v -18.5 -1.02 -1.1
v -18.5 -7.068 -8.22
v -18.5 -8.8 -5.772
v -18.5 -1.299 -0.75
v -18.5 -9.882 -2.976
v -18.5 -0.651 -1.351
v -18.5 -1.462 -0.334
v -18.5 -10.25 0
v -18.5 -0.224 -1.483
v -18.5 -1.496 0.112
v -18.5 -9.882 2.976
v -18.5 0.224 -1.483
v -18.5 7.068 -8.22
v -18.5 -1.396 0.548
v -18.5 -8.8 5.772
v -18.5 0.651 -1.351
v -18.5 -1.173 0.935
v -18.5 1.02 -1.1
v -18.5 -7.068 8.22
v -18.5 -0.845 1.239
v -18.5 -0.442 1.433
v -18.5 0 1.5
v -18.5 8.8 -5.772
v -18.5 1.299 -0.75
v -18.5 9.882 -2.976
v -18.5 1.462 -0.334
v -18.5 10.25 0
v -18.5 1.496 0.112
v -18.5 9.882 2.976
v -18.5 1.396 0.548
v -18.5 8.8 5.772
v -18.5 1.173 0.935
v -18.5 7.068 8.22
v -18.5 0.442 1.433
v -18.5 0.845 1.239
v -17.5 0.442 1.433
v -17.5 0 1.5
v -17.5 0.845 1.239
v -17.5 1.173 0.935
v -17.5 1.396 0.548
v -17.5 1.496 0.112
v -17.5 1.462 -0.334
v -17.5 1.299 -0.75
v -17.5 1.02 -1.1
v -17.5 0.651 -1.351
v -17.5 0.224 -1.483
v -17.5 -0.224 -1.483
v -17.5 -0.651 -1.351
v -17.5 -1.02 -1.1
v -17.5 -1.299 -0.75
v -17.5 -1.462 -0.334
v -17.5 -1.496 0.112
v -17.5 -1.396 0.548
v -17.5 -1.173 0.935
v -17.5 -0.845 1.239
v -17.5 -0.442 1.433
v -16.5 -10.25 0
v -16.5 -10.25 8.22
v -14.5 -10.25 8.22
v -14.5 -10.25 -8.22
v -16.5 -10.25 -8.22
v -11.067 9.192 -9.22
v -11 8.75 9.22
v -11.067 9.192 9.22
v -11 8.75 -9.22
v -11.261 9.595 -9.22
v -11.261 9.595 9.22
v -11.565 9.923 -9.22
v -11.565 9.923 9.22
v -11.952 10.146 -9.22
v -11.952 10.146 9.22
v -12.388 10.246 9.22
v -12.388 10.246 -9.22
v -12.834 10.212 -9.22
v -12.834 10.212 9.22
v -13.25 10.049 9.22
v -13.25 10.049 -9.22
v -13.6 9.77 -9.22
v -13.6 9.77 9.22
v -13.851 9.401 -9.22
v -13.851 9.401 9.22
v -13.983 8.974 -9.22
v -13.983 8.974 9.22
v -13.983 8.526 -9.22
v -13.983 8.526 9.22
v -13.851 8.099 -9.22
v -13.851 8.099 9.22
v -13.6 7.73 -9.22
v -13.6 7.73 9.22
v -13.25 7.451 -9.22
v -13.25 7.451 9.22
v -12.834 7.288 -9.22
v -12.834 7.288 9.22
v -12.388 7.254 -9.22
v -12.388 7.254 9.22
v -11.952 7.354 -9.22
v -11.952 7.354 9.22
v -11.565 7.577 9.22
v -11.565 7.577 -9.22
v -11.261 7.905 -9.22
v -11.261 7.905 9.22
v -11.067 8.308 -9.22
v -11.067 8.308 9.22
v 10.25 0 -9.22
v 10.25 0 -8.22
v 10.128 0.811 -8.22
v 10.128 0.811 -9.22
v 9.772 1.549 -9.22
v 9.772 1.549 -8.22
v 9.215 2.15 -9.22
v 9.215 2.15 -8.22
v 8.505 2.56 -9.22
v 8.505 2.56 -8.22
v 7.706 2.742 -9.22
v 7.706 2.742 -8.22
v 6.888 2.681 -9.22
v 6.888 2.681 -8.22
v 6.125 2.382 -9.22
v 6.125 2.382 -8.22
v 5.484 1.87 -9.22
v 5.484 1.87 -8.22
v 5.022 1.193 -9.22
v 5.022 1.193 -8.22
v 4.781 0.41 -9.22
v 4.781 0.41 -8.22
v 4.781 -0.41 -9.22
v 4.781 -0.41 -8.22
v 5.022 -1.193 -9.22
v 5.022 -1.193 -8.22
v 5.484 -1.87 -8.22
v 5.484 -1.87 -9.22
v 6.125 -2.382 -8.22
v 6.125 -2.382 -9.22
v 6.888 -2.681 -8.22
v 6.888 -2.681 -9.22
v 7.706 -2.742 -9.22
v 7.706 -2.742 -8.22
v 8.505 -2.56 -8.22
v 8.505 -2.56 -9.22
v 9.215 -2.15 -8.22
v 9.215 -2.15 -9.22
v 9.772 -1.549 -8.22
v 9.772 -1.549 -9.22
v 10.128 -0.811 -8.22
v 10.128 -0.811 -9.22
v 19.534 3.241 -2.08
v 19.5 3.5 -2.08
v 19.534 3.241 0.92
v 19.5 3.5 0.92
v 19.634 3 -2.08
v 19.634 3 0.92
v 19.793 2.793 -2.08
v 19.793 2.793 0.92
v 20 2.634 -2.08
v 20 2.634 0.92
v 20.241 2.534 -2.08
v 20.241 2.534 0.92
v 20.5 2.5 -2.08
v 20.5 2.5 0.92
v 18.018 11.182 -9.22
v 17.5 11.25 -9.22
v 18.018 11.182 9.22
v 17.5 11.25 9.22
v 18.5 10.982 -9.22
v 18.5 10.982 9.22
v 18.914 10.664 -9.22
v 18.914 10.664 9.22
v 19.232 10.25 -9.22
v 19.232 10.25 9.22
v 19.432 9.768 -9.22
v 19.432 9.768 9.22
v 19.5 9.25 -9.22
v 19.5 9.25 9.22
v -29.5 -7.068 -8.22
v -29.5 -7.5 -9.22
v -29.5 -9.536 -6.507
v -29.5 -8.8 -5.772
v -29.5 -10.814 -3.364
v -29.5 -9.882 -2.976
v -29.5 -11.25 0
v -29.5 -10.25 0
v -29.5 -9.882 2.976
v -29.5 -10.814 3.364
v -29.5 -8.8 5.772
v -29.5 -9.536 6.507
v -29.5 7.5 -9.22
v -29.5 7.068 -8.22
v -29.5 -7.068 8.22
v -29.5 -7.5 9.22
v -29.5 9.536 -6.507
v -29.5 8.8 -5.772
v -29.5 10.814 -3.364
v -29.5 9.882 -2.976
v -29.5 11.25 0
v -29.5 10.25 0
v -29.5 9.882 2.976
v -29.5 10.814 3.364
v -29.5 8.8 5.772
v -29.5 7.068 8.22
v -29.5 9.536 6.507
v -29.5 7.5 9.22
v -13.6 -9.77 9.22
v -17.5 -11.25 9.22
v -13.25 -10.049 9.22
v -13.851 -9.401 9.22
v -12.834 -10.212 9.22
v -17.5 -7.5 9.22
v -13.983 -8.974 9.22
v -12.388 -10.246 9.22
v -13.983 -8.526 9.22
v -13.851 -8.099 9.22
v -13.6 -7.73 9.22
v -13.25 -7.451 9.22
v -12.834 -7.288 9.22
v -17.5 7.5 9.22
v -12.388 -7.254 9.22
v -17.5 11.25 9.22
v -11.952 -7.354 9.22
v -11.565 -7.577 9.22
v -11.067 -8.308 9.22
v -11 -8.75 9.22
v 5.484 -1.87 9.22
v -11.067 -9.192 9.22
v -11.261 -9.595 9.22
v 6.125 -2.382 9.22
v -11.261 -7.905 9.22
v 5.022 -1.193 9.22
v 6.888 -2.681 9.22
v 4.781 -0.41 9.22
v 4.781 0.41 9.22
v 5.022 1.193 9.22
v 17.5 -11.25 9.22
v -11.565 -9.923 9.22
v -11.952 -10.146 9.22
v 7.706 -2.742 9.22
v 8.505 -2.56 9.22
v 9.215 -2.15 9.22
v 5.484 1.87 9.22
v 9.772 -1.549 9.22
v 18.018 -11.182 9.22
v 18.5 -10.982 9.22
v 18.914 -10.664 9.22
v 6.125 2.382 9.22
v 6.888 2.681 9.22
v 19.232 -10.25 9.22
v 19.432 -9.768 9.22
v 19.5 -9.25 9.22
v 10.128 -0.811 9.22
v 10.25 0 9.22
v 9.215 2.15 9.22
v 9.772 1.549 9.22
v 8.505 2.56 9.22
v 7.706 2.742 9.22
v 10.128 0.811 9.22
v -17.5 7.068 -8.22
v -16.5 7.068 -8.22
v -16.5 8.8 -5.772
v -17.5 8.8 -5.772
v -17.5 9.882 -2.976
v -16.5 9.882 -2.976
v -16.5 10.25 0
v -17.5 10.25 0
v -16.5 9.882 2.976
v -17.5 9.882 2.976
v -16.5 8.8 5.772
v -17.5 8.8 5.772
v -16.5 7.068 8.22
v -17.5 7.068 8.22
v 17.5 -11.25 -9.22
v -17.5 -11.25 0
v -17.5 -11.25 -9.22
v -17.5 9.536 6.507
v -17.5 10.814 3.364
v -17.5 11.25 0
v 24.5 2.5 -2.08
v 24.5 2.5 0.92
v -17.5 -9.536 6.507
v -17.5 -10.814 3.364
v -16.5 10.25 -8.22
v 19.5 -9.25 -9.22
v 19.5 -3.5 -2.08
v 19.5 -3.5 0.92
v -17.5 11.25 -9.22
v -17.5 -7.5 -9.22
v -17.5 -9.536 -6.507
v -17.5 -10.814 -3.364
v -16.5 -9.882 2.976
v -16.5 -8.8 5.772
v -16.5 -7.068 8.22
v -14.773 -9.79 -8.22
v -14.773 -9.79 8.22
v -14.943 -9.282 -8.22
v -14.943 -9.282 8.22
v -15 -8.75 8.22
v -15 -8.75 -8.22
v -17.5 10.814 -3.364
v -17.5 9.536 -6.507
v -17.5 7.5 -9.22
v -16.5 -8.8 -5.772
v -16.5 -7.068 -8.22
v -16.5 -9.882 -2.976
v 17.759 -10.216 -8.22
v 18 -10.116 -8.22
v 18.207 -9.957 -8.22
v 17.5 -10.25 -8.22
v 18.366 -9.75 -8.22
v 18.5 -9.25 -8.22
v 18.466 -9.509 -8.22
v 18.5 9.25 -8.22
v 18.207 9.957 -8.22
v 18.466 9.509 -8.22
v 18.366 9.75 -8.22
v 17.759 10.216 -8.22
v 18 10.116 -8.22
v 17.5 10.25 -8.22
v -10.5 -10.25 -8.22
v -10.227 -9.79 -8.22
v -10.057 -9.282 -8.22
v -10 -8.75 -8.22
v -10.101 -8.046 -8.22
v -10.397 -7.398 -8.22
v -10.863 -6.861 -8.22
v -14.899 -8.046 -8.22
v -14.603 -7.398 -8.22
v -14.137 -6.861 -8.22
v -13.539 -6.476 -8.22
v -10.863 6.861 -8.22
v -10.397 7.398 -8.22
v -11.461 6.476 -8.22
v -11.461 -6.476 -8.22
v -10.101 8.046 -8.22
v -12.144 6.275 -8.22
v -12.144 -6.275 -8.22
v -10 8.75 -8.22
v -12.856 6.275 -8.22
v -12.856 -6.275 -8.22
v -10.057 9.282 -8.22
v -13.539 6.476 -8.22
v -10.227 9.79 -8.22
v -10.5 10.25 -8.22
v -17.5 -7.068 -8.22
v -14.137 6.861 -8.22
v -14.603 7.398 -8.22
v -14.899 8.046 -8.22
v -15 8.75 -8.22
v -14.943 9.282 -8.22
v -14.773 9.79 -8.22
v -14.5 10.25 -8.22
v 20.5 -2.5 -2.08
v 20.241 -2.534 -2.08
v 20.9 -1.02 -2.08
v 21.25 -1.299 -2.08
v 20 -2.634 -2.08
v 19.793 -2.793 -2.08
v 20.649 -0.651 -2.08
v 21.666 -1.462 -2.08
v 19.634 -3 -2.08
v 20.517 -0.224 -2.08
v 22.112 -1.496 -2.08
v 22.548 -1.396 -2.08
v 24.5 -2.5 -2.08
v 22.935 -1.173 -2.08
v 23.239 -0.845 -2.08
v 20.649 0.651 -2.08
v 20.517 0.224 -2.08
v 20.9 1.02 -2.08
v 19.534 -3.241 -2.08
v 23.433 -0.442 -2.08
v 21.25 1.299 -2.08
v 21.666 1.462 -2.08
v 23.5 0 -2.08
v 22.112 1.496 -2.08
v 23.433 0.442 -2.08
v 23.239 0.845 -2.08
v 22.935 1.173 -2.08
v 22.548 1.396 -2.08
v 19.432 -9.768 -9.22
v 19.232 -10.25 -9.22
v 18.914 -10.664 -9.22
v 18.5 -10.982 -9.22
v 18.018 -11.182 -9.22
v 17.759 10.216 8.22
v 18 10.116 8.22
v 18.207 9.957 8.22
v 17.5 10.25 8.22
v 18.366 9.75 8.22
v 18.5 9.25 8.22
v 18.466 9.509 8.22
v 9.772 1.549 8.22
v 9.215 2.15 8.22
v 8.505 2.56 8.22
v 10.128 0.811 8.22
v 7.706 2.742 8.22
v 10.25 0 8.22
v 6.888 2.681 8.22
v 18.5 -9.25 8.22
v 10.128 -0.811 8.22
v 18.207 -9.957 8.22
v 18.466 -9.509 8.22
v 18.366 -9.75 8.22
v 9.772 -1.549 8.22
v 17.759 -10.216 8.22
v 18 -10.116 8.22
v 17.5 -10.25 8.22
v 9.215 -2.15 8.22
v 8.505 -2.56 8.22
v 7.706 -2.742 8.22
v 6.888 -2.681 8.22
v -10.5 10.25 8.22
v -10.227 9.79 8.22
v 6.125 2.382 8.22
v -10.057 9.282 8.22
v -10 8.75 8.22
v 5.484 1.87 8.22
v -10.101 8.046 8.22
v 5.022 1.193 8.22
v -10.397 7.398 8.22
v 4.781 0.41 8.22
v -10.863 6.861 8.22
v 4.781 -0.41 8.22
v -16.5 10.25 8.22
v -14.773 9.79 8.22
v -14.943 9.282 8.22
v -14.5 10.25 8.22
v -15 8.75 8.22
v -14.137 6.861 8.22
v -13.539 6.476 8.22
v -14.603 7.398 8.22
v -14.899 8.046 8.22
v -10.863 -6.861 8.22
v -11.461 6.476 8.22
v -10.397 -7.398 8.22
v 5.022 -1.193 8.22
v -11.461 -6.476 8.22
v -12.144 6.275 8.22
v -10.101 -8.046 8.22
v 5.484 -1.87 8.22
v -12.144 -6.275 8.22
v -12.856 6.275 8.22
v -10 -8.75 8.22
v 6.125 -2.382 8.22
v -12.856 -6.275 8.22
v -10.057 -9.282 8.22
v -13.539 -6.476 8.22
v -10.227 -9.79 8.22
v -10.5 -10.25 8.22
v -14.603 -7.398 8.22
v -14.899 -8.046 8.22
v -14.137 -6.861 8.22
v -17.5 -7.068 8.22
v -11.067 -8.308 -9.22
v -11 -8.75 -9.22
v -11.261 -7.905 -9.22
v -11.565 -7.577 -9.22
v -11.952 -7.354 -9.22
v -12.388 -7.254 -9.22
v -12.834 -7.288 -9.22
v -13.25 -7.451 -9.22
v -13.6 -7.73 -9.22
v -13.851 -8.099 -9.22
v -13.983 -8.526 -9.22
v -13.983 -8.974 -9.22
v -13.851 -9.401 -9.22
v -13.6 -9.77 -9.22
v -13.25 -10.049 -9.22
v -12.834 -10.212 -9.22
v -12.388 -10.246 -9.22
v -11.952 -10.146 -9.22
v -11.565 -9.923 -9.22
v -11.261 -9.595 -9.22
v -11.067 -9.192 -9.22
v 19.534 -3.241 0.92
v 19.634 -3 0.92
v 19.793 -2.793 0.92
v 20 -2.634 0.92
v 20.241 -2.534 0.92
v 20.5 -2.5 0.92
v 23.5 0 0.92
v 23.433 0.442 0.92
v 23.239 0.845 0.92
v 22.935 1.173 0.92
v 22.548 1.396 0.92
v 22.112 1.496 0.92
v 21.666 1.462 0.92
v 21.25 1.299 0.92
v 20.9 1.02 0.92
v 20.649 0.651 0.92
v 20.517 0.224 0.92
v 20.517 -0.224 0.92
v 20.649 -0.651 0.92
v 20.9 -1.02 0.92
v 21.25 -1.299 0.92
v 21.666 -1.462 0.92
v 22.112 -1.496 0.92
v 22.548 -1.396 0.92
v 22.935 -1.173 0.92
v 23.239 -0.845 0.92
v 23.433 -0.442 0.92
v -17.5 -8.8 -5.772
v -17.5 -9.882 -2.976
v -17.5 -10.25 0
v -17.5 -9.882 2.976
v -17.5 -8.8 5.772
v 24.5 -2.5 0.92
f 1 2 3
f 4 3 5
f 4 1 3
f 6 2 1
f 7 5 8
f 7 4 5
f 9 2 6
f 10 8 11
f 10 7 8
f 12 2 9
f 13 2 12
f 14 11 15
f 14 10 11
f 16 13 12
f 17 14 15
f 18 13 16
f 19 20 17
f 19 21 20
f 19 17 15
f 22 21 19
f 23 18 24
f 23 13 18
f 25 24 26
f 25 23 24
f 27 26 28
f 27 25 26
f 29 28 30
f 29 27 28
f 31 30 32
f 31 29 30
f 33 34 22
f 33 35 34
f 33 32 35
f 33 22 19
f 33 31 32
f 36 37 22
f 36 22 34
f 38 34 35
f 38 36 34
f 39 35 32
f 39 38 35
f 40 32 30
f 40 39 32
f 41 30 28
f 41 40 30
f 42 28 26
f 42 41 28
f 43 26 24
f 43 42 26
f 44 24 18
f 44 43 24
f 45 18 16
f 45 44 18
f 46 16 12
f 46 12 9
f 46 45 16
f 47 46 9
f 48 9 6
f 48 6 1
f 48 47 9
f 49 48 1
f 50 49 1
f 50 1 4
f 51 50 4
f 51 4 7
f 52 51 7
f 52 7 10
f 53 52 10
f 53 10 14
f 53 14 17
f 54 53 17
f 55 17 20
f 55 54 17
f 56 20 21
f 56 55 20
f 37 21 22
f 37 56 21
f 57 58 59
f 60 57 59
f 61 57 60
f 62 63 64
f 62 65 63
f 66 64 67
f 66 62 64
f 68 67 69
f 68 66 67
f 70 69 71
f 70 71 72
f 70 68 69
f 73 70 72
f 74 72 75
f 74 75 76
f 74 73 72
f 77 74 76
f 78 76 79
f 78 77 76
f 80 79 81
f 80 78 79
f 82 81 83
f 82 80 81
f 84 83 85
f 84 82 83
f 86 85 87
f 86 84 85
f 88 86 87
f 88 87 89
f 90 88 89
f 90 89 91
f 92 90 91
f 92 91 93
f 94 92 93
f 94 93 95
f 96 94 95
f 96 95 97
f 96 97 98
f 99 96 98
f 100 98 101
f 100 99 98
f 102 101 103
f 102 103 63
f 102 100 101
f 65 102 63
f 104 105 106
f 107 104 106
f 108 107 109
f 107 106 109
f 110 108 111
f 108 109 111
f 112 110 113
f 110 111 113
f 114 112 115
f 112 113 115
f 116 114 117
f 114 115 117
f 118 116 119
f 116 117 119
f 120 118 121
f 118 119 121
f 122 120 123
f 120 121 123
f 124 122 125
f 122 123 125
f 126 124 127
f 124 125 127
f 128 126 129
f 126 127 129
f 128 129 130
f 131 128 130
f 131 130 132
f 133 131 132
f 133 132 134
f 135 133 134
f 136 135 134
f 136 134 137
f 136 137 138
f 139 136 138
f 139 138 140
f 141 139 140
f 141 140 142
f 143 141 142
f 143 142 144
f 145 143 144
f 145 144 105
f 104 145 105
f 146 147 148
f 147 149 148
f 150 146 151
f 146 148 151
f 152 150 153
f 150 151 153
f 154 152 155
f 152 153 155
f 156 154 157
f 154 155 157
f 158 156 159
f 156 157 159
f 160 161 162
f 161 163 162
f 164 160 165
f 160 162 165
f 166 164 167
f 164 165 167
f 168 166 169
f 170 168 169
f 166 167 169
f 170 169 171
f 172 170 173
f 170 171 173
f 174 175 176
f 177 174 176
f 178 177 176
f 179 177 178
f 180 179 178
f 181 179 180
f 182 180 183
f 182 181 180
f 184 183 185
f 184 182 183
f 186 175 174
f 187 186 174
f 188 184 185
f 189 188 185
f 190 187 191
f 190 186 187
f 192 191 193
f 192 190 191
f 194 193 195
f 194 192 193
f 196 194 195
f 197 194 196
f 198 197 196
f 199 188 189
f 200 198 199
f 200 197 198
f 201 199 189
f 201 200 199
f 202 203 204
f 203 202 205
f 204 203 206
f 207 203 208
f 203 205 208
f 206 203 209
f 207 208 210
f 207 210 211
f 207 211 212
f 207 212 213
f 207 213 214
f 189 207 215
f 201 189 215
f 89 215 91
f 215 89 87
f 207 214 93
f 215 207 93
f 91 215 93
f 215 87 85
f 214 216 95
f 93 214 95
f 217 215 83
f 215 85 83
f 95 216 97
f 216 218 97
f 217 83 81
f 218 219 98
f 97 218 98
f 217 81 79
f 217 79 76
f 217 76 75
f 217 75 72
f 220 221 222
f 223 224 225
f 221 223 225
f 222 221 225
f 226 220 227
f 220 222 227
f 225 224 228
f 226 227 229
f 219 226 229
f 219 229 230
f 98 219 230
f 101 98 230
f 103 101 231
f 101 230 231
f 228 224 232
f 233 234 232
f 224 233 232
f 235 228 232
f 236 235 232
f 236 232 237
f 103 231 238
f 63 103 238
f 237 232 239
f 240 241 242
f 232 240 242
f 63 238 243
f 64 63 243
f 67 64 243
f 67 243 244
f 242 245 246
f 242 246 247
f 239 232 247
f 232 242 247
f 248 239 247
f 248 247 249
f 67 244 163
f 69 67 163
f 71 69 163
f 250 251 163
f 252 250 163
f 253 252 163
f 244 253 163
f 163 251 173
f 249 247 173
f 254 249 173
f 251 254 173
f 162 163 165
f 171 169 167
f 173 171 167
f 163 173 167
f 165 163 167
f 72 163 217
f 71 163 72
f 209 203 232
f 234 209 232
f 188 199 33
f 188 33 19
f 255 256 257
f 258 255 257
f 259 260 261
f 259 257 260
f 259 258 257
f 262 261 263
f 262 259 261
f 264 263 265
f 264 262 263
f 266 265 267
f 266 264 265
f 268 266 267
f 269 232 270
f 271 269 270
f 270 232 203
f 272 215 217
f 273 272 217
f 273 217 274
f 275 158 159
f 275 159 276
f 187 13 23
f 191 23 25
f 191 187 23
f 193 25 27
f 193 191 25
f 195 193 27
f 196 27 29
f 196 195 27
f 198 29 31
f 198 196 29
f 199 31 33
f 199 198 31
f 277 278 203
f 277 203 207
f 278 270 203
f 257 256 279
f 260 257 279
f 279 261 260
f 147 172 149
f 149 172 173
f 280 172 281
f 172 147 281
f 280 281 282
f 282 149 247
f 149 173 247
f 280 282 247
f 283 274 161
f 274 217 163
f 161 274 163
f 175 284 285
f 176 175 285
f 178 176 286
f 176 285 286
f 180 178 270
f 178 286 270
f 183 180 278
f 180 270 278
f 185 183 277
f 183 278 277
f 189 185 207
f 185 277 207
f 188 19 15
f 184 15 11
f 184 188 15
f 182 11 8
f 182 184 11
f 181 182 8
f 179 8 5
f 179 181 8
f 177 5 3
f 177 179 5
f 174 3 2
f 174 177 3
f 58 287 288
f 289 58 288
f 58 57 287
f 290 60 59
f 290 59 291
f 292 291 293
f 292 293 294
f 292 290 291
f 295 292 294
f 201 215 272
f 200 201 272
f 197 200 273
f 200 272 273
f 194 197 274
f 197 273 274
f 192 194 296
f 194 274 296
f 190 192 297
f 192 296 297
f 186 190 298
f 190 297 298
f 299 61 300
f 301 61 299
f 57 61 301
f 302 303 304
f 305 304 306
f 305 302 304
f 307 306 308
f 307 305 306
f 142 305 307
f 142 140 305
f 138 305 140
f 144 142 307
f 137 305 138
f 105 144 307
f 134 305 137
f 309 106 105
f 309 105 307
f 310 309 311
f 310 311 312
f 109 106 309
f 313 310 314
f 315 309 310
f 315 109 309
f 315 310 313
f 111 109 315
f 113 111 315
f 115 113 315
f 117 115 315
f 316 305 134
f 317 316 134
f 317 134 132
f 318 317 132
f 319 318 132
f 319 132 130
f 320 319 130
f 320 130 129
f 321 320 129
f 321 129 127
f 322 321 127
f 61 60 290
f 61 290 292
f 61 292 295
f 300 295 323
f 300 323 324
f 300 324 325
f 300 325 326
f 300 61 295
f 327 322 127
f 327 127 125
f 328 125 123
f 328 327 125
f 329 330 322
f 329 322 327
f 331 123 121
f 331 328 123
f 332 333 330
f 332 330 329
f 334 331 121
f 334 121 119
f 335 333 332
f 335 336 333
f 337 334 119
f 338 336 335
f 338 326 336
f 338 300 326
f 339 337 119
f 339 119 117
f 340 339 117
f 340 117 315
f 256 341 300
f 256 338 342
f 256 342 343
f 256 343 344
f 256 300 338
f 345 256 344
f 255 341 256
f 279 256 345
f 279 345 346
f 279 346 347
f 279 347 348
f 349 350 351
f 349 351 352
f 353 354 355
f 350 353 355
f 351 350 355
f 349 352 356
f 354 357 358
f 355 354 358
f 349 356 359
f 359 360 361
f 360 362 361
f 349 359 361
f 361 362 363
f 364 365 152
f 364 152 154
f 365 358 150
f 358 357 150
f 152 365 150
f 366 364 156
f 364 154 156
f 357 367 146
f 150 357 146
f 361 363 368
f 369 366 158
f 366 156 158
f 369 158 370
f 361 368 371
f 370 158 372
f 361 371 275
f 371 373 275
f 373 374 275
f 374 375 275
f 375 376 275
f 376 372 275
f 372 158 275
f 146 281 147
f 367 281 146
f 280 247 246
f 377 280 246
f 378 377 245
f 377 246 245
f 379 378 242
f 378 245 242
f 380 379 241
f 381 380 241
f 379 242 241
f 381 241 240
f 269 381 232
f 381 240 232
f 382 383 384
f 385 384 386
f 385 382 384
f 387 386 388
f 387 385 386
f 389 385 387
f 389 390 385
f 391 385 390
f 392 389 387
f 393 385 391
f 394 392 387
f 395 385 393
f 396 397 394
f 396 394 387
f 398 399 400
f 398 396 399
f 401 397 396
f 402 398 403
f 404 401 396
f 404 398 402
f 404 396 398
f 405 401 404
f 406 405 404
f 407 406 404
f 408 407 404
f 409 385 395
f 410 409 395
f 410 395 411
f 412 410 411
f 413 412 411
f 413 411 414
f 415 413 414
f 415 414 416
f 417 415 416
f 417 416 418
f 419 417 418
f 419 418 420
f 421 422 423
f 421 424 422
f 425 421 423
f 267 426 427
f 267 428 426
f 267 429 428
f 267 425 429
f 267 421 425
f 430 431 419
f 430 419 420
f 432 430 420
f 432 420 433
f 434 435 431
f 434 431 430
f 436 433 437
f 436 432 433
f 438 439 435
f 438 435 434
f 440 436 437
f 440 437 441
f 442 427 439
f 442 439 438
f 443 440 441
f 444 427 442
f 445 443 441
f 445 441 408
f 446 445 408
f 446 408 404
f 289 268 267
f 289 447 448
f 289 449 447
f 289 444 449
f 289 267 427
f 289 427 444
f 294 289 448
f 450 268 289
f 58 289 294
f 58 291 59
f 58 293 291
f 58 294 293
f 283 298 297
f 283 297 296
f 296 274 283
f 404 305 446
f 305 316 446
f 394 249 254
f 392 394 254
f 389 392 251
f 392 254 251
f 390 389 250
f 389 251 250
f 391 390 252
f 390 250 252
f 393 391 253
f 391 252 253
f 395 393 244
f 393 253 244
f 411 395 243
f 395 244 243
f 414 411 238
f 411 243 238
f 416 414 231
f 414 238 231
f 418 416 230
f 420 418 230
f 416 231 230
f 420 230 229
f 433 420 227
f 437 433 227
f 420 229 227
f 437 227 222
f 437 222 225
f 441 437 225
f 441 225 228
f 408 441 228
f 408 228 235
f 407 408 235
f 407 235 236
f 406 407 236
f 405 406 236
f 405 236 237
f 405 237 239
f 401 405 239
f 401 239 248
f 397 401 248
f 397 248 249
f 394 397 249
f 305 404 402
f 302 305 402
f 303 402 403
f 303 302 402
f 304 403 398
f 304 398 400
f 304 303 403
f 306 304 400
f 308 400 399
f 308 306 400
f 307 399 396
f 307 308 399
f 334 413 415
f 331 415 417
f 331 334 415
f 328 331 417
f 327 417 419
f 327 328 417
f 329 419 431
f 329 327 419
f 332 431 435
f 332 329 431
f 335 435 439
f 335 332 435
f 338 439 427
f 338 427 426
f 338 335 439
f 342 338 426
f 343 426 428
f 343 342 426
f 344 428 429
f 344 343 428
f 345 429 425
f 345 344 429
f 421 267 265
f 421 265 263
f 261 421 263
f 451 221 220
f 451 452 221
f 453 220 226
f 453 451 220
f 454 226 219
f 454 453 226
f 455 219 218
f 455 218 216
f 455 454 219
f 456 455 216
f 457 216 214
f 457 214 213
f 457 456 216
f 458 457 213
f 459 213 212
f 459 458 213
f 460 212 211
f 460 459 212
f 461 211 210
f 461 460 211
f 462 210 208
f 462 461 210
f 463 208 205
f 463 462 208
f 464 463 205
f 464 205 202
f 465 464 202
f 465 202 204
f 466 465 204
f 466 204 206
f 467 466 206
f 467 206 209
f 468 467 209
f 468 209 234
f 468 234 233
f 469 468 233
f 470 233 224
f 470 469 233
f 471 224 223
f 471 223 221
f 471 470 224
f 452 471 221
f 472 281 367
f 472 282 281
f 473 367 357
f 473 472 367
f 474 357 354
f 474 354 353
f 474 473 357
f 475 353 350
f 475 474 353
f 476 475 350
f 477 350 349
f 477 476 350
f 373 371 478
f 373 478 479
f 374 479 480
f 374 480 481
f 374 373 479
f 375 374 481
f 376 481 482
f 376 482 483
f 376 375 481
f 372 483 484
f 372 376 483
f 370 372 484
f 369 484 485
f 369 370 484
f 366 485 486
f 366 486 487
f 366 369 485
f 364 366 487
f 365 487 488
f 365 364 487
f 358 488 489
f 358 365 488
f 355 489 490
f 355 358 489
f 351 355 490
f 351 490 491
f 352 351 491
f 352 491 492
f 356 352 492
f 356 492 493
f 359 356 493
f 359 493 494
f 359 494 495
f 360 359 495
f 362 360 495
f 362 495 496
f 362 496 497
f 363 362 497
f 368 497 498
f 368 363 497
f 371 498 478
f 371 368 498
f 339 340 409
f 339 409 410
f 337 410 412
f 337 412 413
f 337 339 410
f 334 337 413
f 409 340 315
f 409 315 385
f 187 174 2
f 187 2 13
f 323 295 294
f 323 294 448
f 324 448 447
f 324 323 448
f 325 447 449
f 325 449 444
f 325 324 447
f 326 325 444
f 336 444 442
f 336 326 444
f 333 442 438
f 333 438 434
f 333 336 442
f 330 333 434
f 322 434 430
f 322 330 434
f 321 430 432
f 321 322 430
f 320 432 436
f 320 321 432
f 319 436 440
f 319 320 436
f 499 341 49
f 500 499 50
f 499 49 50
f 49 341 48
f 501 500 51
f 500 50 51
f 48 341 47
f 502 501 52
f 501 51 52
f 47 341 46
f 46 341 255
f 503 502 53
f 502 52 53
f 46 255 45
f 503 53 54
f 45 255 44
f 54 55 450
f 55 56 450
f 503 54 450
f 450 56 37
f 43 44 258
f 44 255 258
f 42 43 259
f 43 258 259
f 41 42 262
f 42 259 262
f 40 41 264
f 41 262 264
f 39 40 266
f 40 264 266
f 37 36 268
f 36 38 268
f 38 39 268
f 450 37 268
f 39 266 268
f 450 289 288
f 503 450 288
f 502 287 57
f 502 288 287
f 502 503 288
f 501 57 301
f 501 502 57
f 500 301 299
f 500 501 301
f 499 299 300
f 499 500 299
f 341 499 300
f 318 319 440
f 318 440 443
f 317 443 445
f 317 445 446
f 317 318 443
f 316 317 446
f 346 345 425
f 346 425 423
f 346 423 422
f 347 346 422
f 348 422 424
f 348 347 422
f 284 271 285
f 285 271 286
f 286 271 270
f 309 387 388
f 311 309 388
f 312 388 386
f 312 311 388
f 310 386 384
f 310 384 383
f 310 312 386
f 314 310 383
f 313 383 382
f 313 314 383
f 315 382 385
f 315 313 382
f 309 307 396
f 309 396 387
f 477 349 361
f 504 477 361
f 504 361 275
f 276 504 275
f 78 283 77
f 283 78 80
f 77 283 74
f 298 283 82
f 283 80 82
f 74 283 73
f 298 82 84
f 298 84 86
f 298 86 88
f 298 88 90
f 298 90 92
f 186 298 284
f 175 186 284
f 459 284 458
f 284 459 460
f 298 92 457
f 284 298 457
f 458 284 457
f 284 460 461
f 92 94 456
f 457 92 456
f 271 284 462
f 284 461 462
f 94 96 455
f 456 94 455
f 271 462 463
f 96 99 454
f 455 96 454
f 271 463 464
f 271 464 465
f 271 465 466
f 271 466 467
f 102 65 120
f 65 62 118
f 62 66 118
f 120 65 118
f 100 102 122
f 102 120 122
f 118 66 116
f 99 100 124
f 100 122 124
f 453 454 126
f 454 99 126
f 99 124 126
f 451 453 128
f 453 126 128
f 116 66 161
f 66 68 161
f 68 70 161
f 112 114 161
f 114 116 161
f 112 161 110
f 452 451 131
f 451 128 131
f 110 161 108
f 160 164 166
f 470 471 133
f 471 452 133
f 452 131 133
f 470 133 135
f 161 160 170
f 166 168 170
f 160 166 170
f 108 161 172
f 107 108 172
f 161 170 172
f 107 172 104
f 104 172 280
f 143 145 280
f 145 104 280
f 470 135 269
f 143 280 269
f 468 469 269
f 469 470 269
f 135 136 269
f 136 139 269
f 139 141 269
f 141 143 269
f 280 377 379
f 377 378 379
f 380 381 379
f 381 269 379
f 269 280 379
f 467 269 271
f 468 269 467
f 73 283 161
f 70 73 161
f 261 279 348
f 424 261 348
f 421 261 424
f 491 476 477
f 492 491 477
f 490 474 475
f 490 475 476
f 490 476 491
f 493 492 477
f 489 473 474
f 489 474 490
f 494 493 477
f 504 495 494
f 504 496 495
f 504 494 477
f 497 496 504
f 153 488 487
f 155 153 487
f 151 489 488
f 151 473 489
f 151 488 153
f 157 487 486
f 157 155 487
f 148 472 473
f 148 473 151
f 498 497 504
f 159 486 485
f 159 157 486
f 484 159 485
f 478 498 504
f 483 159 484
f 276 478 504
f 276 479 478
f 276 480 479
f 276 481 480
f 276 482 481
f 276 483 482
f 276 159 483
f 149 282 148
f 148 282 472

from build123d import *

# Parameters (mm, degrees)
SKETCH1_R                = 1.5
BOSS_EXTRUDE1_DEPTH      = 9.22
BOSS_EXTRUDE2_DEPTH      = 12
SHELL1_START             = -10
SHELL1_OUTLINE_W         = 20.5
SHELL1_OUTLINE_H         = 16.44
SHELL1_DEPTH             = 27.5
SHELL1_START_2           = -29.5
SHELL1_2_DEPTH           = 14.5
SHELL1_START_3           = -16.5
SHELL1_3_DEPTH           = 1.5
SHELL1_START_4           = -8.22
SHELL1_4_DEPTH           = 16.44
SKETCH3_R                = 1.5
BOSS_EXTRUDE3_DEPTH      = 1
BOSS_EXTRUDE4_DEPTH      = 1.5
BOSS_EXTRUDE4_DEPTH_BACK = 1.5
SKETCH6_W                = 5
SKETCH6_H                = 5
SKETCH6_R                = 1.5
SKETCH7_R                = 2.75
CUT_EXTRUDE1_DEPTH       = 37.562906066
FILLET1_R                = 1


with BuildPart() as part:
    # Sketch1 → Boss-Extrude1 (new, symmetric)
    with BuildSketch(Plane.XY):
        with BuildLine():
            Line((17.5, -11.25), (-17.5, -11.25))
            Line((-17.5, -11.25), (-17.5, 11.25))
            Line((-17.5, 11.25), (17.5, 11.25))
            ThreePointArc((17.5, 11.25), (18.914213562, 10.664213562), (19.5, 9.25))
            Line((19.5, 9.25), (19.5, -9.25))
            ThreePointArc((19.5, -9.25), (18.914213562, -10.664213562), (17.5, -11.25))
        make_face()
        with Locations((-12.5, 8.75)):
            Circle(SKETCH1_R, mode=Mode.SUBTRACT)
        with Locations((-12.5, -8.75)):
            Circle(SKETCH1_R, mode=Mode.SUBTRACT)
    extrude(amount=BOSS_EXTRUDE1_DEPTH, both=True)

    # Sketch2 → Boss-Extrude2 (add)
    with BuildSketch(Plane.ZY.offset(17.5)):
        with BuildLine():
            Line((9.22, -7.5), (9.22, 7.5))
            ThreePointArc((9.22, 7.5), (0, 11.25), (-9.22, 7.5))
            Line((-9.22, 7.5), (-9.22, -7.5))
            ThreePointArc((-9.22, -7.5), (0, -11.25), (9.22, -7.5))
        make_face()
    extrude(amount=BOSS_EXTRUDE2_DEPTH)

    # Shell1: read off the stored shape, not the designer's step
    # Shell1 outline → Shell1 (cut)
    with BuildSketch(Plane.YZ.offset(SHELL1_START)):
        Rectangle(SHELL1_OUTLINE_W, SHELL1_OUTLINE_H)
    extrude(amount=SHELL1_DEPTH, mode=Mode.SUBTRACT)

    # Shell1 2 outline → Shell1 2 (cut)
    with BuildSketch(Plane.YZ.offset(SHELL1_START_2)):
        with BuildLine():
            ThreePointArc((7.068411902, -8.22), (10.25, 0), (7.068411902, 8.22))
            Line((7.068411902, 8.22), (-7.068411902, 8.22))
            ThreePointArc((-7.068411902, 8.22), (-10.25, 0), (-7.068411902, -8.22))
            Line((-7.068411902, -8.22), (7.068411902, -8.22))
        make_face()
    extrude(amount=SHELL1_2_DEPTH, mode=Mode.SUBTRACT)

    # Shell1 3 outline → Shell1 3 (cut)
    with BuildSketch(Plane.YZ.offset(SHELL1_START_3)):
        with BuildLine():
            Line((10.25, 0), (10.25, 8.22))
            Line((10.25, 8.22), (7.068411902, 8.22))
            ThreePointArc((7.068411902, 8.22), (9.426855331, 4.407122157), (10.25, 0))
        make_face()
        with BuildLine():
            Line((10.25, -8.22), (10.25, 0))
            ThreePointArc((10.25, 0), (9.426855331, -4.407122157), (7.068411902, -8.22))
            Line((7.068411902, -8.22), (10.25, -8.22))
        make_face()
        with BuildLine():
            ThreePointArc((-10.25, 0), (-9.426855331, 4.407122157), (-7.068411902, 8.22))
            Line((-7.068411902, 8.22), (-10.25, 8.22))
            Line((-10.25, 8.22), (-10.25, 0))
        make_face()
        with BuildLine():
            Line((-10.25, -8.22), (-7.068411902, -8.22))
            ThreePointArc((-7.068411902, -8.22), (-9.426855331, -4.407122157), (-10.25, 0))
            Line((-10.25, 0), (-10.25, -8.22))
        make_face()
    extrude(amount=SHELL1_3_DEPTH, mode=Mode.SUBTRACT)

    # Shell1 4 outline → Shell1 4 (cut)
    with BuildSketch(Plane.XY.offset(SHELL1_START_4)):
        with BuildLine():
            ThreePointArc((-14.5, -10.25), (-14.871708245, -9.540569415), (-15, -8.75))
            Line((-15, -8.75), (-15, -10.25))
            Line((-15, -10.25), (-14.5, -10.25))
        make_face()
        with BuildLine():
            ThreePointArc((-10, 8.75), (-12.499999993, 6.25), (-15, 8.749999987))
            Line((-15, 8.749999987), (-15, -8.75))
            ThreePointArc((-15, -8.75), (-12.5, -6.25), (-10, -8.75))
            Line((-10, -8.75), (-10, 8.75))
        make_face()
        with BuildLine():
            Line((-14.5, 10.25), (-15, 10.25))
            Line((-15, 10.25), (-15, 8.749999987))
            ThreePointArc((-15, 8.749999987), (-14.871708247, 9.540569409), (-14.5, 10.25))
        make_face()
        with BuildLine():
            ThreePointArc((-10.5, 10.25), (-10.128291755, 9.540569415), (-10, 8.75))
            Line((-10, 8.75), (-10, 10.25))
            Line((-10, 10.25), (-10.5, 10.25))
        make_face()
        with BuildLine():
            Line((-10, -10.25), (-10, -8.75))
            ThreePointArc((-10, -8.75), (-10.128291755, -9.540569415), (-10.5, -10.25))
            Line((-10.5, -10.25), (-10, -10.25))
        make_face()
        with BuildLine():
            ThreePointArc((18.5, 9.25), (18.207106781, 9.957106781), (17.5, 10.25))
            Line((17.5, 10.25), (17.5, -10.25))
            ThreePointArc((17.5, -10.25), (18.207106781, -9.957106781), (18.5, -9.25))
            Line((18.5, -9.25), (18.5, 9.25))
        make_face()
    extrude(amount=SHELL1_4_DEPTH, mode=Mode.SUBTRACT)

    # Sketch3 → Boss-Extrude3 (add)
    with BuildSketch(Plane.ZY.offset(17.5)):
        with BuildLine():
            Line((-9.22, 7.5), (-9.22, -7.5))
            ThreePointArc((-9.22, -7.5), (0, -11.25), (9.22, -7.5))
            Line((9.22, -7.5), (9.22, 7.5))
            ThreePointArc((9.22, 7.5), (0, 11.25), (-9.22, 7.5))
        make_face()
        Circle(SKETCH3_R, mode=Mode.SUBTRACT)
    extrude(amount=BOSS_EXTRUDE3_DEPTH)

    # Sketch6 → Boss-Extrude4 (add, two sides: drawn at the far end of the back side and taken through both)
    with BuildSketch(Plane.XY.offset(-0.58).offset(-BOSS_EXTRUDE4_DEPTH_BACK)):
        with Locations((22, 0)):
            Rectangle(SKETCH6_W, SKETCH6_H)
        with Locations((22, 0)):
            Circle(SKETCH6_R, mode=Mode.SUBTRACT)
    extrude(amount=BOSS_EXTRUDE4_DEPTH + BOSS_EXTRUDE4_DEPTH_BACK)

    # Sketch7 → Cut-Extrude1 (cut, through all)
    with BuildSketch(Plane.XY.offset(9.22)):
        with Locations((7.5, 0)):
            Circle(SKETCH7_R)
    extrude(amount=-CUT_EXTRUDE1_DEPTH, mode=Mode.SUBTRACT)

    # Fillet1
    fillet1_edges = [part.edges().sort_by_distance(p)[0] for p in [
        (19.5, 2.5, -0.58),
        (19.5, -2.5, -0.58),
    ]]
    fillet(fillet1_edges, radius=FILLET1_R)


solid = part.part
